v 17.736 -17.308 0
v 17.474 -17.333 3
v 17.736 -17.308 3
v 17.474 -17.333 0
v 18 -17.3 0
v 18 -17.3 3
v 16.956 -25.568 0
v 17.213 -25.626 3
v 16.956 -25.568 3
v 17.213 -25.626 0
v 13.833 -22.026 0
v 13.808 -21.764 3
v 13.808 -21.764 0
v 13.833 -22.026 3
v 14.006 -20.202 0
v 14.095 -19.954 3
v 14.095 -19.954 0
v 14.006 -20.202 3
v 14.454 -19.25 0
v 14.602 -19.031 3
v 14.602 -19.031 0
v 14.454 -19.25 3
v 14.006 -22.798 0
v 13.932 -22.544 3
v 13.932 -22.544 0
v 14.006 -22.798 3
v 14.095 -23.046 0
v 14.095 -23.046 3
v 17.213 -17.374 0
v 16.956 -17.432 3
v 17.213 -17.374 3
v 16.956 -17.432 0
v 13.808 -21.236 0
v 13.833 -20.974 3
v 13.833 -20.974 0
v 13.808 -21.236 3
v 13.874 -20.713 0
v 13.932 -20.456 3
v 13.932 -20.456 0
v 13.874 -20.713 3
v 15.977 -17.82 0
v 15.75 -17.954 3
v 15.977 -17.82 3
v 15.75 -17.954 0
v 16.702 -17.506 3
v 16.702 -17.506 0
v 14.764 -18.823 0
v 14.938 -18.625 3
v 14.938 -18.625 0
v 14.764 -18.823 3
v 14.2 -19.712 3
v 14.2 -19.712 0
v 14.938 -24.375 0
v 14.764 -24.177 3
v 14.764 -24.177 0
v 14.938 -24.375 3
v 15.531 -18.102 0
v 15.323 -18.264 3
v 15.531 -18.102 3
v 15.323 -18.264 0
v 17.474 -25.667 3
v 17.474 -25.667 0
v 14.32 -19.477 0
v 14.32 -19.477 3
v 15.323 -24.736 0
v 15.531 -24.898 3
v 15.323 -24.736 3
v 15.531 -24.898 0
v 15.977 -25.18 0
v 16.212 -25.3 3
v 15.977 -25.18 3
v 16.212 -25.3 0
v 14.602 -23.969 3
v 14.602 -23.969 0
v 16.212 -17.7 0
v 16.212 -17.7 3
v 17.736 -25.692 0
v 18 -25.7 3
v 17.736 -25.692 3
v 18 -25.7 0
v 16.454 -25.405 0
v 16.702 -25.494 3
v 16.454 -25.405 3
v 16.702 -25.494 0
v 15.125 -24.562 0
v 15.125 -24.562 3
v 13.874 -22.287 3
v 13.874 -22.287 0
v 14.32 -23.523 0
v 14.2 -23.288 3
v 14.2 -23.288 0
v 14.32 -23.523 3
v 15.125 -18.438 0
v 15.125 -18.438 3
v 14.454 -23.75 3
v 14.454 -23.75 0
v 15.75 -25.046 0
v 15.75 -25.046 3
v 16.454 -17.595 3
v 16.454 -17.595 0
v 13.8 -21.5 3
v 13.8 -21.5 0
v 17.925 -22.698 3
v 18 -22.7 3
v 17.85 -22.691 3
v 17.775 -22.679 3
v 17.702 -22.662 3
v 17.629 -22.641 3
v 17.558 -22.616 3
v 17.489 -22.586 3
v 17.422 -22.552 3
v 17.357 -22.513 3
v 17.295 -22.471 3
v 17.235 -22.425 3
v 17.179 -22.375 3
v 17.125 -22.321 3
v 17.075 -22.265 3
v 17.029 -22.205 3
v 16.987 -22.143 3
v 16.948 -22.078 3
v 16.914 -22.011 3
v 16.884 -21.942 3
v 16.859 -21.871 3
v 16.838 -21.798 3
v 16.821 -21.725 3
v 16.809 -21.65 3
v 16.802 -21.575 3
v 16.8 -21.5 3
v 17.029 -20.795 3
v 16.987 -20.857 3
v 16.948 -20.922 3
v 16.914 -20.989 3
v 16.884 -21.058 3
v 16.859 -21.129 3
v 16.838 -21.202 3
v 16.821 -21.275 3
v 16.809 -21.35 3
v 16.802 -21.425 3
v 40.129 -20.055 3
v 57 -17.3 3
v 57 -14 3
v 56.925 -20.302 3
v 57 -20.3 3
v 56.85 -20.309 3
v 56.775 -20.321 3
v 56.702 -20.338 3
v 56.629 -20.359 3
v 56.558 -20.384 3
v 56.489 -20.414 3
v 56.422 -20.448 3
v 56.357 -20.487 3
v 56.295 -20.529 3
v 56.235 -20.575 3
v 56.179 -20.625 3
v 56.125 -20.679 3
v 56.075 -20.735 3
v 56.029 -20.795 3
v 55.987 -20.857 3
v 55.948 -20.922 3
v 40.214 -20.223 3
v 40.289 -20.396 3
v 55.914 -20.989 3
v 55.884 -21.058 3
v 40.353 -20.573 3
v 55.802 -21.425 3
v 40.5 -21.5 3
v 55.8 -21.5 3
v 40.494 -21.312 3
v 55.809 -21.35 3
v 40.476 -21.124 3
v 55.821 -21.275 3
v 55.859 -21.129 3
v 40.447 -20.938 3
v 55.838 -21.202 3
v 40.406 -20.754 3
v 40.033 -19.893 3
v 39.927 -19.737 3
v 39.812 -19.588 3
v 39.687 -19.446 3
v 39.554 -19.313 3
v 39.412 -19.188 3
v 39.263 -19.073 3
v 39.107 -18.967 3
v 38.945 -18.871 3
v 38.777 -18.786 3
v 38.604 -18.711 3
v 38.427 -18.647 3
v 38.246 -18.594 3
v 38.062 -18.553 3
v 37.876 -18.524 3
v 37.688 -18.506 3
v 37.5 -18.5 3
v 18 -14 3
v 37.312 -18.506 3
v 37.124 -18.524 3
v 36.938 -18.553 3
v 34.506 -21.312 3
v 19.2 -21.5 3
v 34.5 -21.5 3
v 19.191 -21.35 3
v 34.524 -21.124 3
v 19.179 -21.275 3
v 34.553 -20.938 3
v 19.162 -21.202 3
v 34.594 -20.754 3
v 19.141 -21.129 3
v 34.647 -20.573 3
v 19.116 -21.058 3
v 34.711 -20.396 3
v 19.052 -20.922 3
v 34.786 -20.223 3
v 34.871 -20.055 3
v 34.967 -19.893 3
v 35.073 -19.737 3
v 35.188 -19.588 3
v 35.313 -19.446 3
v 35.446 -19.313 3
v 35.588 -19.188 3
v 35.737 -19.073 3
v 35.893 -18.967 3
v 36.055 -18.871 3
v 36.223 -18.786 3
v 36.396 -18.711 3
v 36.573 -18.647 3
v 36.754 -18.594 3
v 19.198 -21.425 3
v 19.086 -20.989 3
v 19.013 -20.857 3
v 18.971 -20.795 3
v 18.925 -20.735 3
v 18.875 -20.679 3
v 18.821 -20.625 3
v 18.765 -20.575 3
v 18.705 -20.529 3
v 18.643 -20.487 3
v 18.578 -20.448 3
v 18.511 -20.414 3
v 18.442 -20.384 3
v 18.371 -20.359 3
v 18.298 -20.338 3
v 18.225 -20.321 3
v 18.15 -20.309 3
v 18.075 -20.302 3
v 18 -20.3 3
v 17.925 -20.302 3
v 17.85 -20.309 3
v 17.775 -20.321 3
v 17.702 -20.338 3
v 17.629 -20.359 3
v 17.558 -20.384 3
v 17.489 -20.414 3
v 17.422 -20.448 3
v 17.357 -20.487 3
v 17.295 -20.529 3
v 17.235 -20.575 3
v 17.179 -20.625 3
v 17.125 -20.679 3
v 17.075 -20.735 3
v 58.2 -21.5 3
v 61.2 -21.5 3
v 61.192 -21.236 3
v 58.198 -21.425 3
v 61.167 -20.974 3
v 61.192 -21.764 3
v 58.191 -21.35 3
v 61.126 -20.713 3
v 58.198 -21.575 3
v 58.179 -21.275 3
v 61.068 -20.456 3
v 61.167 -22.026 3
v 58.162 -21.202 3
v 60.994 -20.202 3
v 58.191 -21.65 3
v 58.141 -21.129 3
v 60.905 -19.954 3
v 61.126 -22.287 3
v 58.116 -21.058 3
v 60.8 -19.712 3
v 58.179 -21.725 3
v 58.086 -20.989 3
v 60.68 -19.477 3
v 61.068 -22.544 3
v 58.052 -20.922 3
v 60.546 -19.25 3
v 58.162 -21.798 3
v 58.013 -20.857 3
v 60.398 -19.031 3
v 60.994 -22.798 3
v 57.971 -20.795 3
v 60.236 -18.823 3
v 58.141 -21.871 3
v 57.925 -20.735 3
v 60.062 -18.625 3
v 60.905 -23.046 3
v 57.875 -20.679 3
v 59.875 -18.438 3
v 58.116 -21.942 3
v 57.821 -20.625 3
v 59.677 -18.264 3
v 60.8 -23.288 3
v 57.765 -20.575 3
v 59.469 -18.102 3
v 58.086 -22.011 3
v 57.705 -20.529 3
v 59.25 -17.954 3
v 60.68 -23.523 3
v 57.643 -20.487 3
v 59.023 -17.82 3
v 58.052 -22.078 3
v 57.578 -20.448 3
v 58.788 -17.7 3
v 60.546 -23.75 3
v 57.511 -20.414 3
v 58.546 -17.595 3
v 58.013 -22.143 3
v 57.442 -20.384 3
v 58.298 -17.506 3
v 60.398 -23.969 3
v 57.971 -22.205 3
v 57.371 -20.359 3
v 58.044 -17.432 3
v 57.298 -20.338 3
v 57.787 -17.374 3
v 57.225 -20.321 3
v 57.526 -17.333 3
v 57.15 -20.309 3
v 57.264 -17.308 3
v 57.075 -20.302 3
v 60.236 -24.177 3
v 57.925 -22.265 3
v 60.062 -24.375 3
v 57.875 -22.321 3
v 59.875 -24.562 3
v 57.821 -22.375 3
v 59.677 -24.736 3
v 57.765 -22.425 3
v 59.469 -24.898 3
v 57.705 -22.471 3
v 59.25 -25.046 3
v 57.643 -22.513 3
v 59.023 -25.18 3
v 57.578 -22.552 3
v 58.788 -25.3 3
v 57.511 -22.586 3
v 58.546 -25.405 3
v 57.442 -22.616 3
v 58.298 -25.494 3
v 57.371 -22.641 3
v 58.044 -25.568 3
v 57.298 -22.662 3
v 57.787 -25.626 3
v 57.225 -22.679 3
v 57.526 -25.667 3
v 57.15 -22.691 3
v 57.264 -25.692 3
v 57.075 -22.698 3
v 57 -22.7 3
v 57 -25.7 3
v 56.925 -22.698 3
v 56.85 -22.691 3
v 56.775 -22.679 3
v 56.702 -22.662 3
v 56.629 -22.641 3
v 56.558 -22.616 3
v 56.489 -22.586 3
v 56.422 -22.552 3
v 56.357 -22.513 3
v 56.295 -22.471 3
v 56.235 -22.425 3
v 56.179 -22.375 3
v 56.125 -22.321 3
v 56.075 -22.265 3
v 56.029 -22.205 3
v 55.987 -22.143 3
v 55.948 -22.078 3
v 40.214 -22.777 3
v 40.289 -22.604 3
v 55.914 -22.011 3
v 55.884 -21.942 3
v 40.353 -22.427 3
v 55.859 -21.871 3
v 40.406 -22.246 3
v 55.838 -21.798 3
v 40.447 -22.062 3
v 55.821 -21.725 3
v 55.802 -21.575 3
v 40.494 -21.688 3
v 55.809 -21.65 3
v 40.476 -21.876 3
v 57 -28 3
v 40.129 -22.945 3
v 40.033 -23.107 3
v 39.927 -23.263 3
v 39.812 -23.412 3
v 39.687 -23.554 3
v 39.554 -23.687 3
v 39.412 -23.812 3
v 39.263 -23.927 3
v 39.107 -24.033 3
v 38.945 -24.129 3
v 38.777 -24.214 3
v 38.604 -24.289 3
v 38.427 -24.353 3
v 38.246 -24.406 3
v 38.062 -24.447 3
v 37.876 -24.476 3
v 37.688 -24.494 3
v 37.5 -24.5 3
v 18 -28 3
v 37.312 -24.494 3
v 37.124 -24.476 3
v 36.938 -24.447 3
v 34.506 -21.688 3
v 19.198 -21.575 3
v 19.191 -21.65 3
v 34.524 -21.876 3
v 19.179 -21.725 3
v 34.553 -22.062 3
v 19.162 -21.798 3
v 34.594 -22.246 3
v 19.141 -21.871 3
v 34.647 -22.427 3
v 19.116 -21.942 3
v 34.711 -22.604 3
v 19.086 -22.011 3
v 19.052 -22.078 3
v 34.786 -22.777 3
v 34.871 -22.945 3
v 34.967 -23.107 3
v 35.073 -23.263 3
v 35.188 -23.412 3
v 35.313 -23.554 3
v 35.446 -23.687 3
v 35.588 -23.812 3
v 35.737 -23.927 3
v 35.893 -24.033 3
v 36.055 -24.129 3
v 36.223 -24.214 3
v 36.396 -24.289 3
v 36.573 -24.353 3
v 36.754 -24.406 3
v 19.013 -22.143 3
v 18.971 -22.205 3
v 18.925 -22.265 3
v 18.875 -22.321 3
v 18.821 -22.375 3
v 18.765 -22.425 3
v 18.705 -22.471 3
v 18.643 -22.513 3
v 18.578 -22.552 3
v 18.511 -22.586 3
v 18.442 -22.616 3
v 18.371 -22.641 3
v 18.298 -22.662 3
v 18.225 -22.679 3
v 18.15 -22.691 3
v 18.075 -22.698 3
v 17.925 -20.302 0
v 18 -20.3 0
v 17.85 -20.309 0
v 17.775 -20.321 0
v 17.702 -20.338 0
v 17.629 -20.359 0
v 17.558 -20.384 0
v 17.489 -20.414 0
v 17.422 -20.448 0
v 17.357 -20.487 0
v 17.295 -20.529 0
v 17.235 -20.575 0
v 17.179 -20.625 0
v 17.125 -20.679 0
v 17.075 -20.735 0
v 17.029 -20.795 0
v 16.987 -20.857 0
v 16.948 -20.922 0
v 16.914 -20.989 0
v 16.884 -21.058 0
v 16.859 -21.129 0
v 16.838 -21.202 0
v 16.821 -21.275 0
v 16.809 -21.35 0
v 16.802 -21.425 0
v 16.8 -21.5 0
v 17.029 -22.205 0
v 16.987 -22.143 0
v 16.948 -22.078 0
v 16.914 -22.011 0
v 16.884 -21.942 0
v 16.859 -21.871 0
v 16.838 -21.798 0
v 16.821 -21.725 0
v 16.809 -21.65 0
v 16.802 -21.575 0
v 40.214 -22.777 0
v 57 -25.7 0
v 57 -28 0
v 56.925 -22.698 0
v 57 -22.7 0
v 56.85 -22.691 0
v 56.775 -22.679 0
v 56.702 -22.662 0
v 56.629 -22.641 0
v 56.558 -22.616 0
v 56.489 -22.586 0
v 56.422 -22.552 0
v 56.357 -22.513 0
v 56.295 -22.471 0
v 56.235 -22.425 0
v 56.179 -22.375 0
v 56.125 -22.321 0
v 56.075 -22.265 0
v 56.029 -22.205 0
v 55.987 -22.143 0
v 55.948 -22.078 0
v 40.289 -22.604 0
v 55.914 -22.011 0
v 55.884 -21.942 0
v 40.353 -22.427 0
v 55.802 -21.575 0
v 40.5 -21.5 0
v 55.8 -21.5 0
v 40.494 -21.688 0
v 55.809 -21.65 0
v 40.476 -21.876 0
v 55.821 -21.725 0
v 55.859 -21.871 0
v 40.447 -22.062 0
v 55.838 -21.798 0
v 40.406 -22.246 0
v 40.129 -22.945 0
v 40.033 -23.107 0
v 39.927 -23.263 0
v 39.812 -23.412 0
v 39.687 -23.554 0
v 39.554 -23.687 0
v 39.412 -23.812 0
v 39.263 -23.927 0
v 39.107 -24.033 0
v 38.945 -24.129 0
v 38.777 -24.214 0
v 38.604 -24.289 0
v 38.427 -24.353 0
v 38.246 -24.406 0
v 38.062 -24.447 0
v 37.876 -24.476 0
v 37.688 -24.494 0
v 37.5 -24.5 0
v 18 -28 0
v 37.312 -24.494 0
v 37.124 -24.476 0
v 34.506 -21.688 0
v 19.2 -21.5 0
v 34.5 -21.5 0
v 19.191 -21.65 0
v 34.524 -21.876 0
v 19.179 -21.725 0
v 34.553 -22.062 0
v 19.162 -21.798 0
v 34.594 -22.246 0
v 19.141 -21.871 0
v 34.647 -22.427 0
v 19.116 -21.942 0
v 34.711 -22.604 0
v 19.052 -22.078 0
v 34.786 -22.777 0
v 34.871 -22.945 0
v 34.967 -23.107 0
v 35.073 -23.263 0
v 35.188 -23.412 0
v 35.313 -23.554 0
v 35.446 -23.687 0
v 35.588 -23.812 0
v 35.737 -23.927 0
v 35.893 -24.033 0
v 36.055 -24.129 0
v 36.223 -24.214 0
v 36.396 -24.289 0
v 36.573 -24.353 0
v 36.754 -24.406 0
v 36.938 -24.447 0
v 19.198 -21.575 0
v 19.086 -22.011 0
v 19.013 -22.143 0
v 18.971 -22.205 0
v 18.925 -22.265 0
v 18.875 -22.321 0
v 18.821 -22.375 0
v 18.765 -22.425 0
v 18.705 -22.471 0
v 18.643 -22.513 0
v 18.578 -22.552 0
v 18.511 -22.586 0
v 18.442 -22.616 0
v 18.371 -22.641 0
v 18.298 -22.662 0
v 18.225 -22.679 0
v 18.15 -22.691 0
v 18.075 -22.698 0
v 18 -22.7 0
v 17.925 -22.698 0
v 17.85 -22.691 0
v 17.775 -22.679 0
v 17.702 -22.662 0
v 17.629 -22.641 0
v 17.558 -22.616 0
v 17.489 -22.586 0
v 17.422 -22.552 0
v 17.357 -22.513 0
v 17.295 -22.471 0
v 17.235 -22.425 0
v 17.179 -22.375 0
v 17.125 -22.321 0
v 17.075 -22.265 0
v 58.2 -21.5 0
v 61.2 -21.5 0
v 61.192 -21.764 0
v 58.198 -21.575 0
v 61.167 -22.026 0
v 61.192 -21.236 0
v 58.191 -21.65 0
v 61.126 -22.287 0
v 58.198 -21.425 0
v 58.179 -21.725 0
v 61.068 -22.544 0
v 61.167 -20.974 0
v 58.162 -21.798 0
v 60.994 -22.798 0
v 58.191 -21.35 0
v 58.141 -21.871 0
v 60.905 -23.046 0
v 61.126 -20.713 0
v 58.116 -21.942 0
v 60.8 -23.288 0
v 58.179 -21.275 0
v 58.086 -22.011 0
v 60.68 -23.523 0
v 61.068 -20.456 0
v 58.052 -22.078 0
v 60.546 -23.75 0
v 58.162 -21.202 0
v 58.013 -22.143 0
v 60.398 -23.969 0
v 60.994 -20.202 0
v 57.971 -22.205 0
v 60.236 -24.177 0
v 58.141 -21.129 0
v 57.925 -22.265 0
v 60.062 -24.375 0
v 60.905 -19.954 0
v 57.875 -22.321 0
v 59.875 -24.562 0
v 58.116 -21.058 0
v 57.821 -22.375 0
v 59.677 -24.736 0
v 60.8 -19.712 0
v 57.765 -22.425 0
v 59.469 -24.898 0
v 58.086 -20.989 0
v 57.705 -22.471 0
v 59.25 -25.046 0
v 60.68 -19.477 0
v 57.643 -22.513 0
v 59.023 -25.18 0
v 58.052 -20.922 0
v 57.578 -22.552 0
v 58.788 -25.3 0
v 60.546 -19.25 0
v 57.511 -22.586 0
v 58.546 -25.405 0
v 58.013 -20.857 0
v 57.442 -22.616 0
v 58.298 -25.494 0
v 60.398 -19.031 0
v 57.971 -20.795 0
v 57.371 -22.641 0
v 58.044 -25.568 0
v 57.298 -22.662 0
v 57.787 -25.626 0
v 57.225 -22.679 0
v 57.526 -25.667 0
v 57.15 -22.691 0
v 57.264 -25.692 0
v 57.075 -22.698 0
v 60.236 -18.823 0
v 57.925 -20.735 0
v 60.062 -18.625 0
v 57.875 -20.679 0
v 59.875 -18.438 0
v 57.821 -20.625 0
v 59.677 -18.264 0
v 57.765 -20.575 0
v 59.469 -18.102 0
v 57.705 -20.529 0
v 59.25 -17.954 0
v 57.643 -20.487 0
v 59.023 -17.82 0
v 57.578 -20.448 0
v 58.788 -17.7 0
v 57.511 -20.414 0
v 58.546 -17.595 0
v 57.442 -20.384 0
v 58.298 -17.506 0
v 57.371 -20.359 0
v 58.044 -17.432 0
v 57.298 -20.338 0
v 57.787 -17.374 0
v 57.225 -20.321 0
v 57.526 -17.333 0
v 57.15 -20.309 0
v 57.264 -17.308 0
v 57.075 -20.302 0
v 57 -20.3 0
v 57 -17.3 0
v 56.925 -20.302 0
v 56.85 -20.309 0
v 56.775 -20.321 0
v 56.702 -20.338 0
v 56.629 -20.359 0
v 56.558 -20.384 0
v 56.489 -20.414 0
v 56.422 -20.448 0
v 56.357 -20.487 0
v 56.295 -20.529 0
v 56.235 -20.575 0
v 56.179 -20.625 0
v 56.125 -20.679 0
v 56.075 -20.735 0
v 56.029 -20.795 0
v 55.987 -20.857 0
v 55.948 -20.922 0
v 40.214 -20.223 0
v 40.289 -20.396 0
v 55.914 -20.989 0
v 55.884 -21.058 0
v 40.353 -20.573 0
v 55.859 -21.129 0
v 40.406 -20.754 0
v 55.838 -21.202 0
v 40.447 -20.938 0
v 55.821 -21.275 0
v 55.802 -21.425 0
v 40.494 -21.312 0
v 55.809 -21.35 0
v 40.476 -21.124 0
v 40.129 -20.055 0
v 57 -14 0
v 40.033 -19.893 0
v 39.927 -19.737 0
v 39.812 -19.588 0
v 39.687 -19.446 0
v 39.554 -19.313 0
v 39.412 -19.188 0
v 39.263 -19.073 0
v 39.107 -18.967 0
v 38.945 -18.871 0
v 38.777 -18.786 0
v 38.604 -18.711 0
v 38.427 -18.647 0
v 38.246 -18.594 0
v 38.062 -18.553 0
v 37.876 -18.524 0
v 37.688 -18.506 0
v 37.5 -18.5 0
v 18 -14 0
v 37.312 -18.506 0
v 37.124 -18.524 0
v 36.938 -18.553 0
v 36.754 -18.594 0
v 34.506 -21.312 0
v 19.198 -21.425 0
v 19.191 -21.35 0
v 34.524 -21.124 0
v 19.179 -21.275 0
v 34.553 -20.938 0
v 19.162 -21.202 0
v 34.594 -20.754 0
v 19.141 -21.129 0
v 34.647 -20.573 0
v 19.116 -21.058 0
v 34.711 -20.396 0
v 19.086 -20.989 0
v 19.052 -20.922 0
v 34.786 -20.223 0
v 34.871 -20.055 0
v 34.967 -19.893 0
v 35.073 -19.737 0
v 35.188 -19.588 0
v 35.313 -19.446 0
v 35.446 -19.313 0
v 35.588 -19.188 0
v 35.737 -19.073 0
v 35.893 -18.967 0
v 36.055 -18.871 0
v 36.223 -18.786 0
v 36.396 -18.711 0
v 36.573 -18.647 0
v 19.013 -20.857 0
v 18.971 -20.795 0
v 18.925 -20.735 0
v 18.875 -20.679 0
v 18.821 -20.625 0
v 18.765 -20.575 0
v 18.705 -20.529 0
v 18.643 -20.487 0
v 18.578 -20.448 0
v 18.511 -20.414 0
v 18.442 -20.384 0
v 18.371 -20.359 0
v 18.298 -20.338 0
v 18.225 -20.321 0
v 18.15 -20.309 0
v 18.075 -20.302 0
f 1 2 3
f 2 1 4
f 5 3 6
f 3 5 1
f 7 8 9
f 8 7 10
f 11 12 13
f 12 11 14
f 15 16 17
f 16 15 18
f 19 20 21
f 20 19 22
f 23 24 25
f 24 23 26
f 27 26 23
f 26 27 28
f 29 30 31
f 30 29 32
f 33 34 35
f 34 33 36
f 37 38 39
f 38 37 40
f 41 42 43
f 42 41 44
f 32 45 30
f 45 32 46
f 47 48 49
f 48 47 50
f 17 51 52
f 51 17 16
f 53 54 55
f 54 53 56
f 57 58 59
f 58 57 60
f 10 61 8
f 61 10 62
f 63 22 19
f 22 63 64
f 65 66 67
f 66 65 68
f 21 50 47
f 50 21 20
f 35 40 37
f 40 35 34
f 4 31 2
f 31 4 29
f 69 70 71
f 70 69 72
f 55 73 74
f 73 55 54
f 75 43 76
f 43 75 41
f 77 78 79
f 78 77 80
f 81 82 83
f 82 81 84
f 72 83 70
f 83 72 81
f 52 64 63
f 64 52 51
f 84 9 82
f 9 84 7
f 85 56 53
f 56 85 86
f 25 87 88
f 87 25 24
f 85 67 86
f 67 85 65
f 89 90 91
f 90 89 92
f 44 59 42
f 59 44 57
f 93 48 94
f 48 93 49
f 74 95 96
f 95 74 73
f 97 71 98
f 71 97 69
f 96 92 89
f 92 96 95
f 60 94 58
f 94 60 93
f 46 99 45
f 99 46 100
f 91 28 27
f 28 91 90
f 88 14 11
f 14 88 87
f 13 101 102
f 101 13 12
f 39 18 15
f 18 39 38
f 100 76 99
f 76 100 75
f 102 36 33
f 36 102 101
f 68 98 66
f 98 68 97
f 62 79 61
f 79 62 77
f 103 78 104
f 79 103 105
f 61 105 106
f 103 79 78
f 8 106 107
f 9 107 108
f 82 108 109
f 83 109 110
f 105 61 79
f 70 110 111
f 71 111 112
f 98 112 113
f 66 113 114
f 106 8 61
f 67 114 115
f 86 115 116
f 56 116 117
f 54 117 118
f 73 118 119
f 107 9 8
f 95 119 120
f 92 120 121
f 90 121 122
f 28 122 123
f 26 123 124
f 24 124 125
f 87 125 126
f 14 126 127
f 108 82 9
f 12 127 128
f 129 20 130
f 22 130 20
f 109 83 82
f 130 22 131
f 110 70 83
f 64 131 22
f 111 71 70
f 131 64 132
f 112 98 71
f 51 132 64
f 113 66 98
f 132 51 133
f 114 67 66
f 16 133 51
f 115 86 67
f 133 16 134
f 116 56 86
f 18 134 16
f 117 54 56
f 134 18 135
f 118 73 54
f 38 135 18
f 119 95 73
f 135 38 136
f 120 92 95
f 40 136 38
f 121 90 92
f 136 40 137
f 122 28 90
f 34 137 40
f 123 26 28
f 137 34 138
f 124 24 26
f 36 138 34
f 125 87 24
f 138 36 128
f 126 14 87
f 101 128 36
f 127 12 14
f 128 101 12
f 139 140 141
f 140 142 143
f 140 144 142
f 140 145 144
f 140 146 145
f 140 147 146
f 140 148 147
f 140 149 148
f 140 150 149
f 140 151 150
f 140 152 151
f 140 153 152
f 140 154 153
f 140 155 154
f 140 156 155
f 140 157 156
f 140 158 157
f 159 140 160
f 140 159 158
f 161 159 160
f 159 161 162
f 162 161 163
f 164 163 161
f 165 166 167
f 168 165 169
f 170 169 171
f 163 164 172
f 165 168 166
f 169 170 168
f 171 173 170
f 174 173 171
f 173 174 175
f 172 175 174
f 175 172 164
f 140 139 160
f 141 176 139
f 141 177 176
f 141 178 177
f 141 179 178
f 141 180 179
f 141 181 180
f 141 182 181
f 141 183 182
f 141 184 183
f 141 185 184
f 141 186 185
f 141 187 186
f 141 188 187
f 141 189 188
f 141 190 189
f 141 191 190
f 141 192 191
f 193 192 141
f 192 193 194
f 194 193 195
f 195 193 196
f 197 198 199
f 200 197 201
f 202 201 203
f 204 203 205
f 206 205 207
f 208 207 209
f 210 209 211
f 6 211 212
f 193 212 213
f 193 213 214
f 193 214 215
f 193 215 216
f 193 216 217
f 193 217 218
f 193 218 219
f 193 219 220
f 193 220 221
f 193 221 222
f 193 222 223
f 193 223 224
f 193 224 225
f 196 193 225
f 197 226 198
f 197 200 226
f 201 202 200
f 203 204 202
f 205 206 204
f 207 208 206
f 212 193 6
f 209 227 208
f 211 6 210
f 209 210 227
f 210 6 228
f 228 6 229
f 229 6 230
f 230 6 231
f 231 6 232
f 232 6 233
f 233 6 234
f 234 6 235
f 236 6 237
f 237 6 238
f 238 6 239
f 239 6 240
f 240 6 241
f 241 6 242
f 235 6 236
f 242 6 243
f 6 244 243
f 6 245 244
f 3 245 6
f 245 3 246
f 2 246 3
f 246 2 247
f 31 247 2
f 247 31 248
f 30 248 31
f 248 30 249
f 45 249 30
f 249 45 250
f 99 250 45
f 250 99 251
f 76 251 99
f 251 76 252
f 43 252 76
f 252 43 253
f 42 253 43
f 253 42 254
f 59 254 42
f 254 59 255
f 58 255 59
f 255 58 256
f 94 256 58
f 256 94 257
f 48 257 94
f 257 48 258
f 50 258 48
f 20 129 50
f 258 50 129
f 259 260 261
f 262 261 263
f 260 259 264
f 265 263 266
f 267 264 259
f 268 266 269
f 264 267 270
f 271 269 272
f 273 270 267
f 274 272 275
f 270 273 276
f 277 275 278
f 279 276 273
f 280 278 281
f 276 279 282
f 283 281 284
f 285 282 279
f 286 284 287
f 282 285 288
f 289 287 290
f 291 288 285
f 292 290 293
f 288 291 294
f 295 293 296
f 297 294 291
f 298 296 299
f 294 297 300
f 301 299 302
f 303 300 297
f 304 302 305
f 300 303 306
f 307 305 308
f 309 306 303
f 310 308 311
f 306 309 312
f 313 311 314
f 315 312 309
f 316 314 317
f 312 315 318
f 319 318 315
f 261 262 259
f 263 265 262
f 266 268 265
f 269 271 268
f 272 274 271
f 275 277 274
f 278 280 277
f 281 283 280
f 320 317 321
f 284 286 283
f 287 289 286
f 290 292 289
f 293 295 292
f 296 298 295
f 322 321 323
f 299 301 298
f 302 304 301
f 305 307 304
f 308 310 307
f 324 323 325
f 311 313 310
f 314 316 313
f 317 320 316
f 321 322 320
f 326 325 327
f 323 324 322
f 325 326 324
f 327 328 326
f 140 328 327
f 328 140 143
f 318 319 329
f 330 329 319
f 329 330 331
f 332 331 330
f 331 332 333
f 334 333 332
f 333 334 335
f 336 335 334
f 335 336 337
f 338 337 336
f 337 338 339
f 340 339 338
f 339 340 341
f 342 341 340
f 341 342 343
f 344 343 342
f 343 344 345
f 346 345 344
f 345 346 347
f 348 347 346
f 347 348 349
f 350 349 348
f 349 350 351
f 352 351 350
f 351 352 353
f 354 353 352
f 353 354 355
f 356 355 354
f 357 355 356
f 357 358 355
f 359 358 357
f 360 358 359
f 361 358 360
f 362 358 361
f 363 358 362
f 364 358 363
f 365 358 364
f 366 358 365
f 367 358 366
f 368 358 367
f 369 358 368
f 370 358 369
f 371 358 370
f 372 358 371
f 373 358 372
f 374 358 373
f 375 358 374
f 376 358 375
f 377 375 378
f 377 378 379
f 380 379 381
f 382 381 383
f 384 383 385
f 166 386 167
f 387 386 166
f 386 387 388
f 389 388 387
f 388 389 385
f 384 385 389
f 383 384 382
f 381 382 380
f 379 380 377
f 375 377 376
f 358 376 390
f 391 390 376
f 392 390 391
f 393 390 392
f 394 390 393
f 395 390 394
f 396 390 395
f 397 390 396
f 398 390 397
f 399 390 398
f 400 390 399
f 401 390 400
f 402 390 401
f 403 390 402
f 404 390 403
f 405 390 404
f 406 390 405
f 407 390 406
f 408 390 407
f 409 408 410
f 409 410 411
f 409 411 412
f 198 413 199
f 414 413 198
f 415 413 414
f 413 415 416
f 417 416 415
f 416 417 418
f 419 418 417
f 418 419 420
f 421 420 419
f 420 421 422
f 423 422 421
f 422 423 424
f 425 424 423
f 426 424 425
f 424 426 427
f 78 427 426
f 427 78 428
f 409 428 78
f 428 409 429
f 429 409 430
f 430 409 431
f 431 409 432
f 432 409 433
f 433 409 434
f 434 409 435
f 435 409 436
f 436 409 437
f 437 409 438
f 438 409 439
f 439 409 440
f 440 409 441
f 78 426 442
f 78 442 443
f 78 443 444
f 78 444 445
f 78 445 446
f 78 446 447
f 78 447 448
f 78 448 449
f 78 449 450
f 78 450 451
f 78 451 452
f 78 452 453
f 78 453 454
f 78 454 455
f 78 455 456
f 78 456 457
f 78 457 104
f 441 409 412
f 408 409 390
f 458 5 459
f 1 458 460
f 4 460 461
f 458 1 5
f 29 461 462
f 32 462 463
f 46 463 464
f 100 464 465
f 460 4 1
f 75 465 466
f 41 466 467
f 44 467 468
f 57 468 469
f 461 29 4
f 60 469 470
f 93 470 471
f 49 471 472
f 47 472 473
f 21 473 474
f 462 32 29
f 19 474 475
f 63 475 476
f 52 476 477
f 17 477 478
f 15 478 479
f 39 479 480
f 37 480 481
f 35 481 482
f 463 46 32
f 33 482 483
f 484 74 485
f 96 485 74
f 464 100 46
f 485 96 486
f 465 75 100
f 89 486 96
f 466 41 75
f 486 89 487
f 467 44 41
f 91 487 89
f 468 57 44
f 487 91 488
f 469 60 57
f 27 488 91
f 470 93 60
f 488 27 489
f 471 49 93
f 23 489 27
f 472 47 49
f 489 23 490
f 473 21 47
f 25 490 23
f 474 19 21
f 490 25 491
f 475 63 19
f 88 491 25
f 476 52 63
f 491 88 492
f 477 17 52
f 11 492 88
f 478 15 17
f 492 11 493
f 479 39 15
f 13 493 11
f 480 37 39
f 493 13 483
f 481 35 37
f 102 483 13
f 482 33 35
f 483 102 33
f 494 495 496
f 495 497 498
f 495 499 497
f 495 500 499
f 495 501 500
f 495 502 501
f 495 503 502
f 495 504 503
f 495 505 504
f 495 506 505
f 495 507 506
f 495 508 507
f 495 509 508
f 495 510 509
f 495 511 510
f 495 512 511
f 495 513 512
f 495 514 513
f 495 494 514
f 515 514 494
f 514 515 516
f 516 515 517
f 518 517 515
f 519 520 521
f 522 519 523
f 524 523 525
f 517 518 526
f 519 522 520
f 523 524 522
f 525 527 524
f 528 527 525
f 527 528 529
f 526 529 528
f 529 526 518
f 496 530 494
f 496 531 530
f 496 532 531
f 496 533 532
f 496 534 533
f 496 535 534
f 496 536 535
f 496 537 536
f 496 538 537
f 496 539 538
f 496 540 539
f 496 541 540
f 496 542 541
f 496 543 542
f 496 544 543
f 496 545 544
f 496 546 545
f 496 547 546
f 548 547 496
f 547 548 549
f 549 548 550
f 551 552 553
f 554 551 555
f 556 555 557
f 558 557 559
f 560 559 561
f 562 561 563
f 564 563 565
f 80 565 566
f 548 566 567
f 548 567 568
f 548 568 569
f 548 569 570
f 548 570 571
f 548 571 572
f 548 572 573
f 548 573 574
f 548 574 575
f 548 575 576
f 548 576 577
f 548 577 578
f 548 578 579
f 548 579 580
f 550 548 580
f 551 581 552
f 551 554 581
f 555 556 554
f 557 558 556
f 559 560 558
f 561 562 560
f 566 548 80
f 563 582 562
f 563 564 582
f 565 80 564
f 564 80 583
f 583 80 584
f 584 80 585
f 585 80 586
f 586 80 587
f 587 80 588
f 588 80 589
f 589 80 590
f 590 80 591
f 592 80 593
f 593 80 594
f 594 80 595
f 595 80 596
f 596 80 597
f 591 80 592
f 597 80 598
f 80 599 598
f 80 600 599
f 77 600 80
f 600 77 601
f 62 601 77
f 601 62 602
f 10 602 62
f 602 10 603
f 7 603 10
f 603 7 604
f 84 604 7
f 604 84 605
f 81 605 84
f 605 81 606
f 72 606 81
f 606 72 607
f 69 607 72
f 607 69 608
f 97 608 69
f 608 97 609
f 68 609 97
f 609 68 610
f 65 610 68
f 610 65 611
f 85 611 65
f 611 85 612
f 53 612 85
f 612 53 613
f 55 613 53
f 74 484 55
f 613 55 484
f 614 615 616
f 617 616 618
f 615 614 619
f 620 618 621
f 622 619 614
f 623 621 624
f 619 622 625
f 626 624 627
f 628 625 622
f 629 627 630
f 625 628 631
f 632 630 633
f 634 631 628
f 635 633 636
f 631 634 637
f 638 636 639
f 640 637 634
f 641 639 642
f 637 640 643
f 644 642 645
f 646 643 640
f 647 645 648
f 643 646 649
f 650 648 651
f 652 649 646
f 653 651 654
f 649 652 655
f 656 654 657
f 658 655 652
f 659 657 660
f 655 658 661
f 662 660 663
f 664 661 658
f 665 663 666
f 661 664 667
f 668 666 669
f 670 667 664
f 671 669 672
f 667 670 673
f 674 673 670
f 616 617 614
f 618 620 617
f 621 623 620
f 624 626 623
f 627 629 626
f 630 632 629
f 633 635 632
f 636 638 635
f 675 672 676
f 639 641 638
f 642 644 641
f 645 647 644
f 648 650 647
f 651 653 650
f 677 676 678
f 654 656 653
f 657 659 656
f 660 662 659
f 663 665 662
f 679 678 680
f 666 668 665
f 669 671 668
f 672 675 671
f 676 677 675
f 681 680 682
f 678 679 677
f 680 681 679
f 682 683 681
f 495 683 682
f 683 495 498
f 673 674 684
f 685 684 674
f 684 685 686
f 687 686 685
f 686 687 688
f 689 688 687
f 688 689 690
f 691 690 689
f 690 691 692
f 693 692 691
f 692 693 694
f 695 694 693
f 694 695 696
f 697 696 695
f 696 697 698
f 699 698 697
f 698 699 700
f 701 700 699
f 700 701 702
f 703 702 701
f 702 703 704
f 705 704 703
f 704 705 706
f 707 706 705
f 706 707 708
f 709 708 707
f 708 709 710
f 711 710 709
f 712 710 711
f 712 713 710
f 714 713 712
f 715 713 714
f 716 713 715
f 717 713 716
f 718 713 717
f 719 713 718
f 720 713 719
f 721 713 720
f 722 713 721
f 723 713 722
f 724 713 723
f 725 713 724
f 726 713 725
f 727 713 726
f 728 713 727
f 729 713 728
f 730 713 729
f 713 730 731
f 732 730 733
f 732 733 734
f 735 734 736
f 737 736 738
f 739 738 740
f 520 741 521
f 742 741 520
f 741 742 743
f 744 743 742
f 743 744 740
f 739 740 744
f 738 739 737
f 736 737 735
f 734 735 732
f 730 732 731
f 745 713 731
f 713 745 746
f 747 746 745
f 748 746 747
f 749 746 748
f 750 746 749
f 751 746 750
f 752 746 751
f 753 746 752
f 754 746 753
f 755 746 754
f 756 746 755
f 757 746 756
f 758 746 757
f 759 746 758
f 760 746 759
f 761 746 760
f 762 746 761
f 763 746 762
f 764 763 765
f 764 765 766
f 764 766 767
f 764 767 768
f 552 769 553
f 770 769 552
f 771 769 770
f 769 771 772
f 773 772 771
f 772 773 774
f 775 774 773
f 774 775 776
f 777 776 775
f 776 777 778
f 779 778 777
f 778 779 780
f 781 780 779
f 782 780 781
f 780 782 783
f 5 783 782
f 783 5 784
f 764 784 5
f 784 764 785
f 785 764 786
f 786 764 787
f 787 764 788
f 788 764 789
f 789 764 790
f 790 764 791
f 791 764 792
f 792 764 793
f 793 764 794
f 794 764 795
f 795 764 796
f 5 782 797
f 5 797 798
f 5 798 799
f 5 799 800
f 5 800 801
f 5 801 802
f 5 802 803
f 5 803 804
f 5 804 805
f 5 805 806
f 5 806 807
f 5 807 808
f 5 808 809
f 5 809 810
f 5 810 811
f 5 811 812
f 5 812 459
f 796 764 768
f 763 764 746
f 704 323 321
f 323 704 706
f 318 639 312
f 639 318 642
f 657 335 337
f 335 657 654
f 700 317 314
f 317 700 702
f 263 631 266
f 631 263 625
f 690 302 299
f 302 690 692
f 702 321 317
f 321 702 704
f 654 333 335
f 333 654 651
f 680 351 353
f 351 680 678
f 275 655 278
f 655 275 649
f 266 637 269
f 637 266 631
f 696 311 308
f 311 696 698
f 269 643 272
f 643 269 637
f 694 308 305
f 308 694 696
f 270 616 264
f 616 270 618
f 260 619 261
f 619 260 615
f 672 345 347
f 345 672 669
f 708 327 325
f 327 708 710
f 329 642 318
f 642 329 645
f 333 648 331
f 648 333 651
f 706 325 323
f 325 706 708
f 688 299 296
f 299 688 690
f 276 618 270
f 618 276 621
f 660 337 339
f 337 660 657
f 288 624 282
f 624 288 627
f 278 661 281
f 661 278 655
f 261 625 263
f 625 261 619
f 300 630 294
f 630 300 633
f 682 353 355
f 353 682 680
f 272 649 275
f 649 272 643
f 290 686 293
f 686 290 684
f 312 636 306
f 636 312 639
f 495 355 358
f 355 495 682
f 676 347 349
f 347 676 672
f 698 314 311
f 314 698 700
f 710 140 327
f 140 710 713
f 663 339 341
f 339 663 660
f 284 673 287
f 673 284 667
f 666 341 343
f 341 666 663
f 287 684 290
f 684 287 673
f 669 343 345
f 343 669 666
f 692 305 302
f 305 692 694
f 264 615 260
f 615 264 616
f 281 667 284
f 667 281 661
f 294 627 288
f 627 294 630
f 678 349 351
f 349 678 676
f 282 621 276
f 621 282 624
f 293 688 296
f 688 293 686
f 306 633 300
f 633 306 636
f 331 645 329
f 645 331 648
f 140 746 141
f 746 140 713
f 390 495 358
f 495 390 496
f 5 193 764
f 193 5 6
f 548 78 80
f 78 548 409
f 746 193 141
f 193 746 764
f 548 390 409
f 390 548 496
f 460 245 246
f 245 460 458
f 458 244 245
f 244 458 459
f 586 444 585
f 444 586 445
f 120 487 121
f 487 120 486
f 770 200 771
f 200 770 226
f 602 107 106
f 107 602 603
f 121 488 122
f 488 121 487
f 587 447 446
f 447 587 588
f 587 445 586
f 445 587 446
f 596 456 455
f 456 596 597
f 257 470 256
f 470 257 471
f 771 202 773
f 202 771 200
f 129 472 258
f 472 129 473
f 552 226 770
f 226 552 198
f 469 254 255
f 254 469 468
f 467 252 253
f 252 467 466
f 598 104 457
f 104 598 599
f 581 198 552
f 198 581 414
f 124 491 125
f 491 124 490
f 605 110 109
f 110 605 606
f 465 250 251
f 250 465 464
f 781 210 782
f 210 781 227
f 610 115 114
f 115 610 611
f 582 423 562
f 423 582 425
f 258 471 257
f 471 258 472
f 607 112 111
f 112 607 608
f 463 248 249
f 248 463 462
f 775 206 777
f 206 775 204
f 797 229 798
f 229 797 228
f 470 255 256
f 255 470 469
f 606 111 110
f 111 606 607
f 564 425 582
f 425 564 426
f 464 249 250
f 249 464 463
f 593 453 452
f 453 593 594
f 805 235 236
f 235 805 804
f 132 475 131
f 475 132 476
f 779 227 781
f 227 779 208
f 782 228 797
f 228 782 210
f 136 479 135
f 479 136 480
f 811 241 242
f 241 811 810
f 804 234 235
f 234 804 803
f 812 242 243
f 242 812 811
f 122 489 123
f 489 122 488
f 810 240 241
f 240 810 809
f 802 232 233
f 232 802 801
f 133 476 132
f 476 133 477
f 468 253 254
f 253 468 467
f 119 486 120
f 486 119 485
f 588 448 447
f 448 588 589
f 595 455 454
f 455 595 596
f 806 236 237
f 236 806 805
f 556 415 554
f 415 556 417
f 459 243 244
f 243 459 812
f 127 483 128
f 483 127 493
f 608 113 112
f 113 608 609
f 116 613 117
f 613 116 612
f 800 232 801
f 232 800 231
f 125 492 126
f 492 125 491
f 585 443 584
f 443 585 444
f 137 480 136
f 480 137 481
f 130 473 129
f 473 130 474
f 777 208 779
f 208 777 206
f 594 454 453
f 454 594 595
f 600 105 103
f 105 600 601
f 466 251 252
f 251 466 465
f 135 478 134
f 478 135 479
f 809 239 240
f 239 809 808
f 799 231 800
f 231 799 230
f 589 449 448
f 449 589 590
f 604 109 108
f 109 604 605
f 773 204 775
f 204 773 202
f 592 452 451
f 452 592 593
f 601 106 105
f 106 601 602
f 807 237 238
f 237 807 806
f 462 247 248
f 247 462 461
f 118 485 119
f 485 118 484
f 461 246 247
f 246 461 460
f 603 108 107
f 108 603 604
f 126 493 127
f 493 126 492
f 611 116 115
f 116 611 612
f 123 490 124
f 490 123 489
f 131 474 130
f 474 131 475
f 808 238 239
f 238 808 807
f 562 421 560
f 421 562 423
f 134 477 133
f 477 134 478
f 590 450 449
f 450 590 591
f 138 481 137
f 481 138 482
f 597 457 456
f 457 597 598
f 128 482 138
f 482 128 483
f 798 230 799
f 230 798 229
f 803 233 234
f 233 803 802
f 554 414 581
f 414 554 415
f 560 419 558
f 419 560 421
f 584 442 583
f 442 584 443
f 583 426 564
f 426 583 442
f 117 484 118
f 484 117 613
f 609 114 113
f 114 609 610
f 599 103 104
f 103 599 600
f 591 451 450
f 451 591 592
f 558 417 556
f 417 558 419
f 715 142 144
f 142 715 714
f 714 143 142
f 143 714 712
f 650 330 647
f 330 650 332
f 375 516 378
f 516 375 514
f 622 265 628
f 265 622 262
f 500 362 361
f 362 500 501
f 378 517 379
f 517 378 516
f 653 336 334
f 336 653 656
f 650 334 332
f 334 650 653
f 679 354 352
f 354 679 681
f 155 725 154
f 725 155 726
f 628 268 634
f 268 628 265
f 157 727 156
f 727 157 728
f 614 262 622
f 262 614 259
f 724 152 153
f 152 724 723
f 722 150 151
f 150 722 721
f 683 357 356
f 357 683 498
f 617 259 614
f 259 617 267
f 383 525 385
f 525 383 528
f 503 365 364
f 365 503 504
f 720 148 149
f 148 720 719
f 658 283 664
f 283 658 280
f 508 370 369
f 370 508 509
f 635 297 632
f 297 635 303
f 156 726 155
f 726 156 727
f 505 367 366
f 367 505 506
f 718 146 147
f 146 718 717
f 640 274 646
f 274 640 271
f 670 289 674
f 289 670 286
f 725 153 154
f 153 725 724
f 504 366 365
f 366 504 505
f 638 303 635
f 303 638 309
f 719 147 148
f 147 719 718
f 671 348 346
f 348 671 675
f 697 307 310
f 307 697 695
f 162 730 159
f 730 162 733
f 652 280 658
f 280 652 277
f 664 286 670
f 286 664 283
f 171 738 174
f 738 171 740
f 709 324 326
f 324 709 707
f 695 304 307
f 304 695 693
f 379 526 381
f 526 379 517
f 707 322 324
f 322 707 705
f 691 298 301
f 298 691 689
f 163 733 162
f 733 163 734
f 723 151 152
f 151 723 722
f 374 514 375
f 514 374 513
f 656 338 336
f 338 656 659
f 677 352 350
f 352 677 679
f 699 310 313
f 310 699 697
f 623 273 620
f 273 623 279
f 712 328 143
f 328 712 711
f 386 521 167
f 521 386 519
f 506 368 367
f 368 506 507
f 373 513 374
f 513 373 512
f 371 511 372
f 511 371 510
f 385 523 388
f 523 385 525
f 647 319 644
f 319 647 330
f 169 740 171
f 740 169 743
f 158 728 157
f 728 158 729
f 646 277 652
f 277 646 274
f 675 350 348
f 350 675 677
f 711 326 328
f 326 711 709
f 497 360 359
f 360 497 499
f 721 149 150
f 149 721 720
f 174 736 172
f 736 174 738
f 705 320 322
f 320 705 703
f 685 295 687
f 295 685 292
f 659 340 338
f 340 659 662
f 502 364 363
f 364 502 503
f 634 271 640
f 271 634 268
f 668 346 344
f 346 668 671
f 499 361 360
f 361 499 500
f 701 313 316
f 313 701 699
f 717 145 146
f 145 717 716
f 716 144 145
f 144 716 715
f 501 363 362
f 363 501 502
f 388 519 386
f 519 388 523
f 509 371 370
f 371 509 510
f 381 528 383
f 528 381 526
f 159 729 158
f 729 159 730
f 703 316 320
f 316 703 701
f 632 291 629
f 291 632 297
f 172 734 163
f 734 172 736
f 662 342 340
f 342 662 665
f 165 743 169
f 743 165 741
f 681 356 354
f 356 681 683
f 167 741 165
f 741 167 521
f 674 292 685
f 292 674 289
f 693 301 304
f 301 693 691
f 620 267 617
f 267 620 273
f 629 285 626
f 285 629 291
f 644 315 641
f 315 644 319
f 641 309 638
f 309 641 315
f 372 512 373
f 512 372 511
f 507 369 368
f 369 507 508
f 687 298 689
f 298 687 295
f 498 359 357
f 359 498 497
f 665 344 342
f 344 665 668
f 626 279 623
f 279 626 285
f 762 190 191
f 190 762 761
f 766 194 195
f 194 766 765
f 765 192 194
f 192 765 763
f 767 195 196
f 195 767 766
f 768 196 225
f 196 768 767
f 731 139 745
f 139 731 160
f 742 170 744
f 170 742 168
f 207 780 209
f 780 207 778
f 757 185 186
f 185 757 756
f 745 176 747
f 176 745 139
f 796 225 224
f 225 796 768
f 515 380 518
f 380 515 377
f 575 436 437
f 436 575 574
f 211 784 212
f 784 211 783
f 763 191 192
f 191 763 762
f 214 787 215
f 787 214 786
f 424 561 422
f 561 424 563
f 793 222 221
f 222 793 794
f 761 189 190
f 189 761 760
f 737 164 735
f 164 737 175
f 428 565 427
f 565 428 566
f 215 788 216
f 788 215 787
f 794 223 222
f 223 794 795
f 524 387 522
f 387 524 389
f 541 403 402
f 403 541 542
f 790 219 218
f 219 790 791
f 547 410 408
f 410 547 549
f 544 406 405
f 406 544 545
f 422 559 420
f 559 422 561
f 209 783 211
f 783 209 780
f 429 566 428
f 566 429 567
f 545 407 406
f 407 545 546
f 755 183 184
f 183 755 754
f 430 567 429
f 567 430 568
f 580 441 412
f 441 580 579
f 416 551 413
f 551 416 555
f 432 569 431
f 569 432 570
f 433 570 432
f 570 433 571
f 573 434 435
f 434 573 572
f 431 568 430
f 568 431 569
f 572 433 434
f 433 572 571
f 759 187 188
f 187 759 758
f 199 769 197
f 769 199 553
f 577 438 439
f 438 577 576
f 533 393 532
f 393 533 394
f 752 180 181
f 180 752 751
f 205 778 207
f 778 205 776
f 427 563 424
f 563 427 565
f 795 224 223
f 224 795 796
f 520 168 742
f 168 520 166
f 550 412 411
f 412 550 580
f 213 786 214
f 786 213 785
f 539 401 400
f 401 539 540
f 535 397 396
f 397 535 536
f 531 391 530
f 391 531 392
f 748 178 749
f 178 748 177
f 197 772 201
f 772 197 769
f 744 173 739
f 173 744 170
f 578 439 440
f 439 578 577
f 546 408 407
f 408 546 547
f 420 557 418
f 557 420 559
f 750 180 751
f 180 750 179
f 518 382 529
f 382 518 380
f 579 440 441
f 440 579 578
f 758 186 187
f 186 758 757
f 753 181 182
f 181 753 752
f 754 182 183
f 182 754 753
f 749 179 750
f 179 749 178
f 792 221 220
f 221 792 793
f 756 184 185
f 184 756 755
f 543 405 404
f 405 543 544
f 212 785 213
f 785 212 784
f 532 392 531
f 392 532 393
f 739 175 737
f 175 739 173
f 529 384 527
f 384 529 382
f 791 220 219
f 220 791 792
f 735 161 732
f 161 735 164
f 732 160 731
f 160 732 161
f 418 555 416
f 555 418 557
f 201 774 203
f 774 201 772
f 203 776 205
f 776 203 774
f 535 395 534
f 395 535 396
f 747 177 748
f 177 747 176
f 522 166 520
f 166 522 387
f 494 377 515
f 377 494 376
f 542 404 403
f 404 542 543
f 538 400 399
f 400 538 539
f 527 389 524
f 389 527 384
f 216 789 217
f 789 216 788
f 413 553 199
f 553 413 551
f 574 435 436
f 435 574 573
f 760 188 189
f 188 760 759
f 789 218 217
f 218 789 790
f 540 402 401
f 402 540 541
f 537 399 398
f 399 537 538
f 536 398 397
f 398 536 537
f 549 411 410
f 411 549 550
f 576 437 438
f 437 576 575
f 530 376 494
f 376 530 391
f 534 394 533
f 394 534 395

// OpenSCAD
difference(){
	union(){


        
        // verdikking voor schuifcontacten

        translate([18,24-52+6.5,0]){
            rotate([0,0,90]){
                cylinder(h=3, r=4.2, $fn=100, center=false);
            }
        }        
        translate([18+39,24-52+6.5,0]){
            rotate([0,0,90]){
                cylinder(h=3, r=4.2, $fn=100, center=false);
            }
        }        
        translate([18,24-52,0]){
           cube([39,14,3], center=false);
        }


        
	}
	union() {

        // schroefgaten deksel verticale assen
        translate([18,24-52+6.5,-1]){
            rotate([0,0,90]){
                cylinder(h=48, r=1.2, $fn=100, center=false);
            }
        }        
        translate([18+39,24-52+6.5,-1]){
            rotate([0,0,90]){
                cylinder(h=48, r=1.2, $fn=100, center=false);
            }
        }        

        translate([18+39/2,24-52+6.5,-1]){
            rotate([0,0,90]){
                cylinder(h=48, r=3, $fn=100, center=false);
            }
        }        
        

	}
}
